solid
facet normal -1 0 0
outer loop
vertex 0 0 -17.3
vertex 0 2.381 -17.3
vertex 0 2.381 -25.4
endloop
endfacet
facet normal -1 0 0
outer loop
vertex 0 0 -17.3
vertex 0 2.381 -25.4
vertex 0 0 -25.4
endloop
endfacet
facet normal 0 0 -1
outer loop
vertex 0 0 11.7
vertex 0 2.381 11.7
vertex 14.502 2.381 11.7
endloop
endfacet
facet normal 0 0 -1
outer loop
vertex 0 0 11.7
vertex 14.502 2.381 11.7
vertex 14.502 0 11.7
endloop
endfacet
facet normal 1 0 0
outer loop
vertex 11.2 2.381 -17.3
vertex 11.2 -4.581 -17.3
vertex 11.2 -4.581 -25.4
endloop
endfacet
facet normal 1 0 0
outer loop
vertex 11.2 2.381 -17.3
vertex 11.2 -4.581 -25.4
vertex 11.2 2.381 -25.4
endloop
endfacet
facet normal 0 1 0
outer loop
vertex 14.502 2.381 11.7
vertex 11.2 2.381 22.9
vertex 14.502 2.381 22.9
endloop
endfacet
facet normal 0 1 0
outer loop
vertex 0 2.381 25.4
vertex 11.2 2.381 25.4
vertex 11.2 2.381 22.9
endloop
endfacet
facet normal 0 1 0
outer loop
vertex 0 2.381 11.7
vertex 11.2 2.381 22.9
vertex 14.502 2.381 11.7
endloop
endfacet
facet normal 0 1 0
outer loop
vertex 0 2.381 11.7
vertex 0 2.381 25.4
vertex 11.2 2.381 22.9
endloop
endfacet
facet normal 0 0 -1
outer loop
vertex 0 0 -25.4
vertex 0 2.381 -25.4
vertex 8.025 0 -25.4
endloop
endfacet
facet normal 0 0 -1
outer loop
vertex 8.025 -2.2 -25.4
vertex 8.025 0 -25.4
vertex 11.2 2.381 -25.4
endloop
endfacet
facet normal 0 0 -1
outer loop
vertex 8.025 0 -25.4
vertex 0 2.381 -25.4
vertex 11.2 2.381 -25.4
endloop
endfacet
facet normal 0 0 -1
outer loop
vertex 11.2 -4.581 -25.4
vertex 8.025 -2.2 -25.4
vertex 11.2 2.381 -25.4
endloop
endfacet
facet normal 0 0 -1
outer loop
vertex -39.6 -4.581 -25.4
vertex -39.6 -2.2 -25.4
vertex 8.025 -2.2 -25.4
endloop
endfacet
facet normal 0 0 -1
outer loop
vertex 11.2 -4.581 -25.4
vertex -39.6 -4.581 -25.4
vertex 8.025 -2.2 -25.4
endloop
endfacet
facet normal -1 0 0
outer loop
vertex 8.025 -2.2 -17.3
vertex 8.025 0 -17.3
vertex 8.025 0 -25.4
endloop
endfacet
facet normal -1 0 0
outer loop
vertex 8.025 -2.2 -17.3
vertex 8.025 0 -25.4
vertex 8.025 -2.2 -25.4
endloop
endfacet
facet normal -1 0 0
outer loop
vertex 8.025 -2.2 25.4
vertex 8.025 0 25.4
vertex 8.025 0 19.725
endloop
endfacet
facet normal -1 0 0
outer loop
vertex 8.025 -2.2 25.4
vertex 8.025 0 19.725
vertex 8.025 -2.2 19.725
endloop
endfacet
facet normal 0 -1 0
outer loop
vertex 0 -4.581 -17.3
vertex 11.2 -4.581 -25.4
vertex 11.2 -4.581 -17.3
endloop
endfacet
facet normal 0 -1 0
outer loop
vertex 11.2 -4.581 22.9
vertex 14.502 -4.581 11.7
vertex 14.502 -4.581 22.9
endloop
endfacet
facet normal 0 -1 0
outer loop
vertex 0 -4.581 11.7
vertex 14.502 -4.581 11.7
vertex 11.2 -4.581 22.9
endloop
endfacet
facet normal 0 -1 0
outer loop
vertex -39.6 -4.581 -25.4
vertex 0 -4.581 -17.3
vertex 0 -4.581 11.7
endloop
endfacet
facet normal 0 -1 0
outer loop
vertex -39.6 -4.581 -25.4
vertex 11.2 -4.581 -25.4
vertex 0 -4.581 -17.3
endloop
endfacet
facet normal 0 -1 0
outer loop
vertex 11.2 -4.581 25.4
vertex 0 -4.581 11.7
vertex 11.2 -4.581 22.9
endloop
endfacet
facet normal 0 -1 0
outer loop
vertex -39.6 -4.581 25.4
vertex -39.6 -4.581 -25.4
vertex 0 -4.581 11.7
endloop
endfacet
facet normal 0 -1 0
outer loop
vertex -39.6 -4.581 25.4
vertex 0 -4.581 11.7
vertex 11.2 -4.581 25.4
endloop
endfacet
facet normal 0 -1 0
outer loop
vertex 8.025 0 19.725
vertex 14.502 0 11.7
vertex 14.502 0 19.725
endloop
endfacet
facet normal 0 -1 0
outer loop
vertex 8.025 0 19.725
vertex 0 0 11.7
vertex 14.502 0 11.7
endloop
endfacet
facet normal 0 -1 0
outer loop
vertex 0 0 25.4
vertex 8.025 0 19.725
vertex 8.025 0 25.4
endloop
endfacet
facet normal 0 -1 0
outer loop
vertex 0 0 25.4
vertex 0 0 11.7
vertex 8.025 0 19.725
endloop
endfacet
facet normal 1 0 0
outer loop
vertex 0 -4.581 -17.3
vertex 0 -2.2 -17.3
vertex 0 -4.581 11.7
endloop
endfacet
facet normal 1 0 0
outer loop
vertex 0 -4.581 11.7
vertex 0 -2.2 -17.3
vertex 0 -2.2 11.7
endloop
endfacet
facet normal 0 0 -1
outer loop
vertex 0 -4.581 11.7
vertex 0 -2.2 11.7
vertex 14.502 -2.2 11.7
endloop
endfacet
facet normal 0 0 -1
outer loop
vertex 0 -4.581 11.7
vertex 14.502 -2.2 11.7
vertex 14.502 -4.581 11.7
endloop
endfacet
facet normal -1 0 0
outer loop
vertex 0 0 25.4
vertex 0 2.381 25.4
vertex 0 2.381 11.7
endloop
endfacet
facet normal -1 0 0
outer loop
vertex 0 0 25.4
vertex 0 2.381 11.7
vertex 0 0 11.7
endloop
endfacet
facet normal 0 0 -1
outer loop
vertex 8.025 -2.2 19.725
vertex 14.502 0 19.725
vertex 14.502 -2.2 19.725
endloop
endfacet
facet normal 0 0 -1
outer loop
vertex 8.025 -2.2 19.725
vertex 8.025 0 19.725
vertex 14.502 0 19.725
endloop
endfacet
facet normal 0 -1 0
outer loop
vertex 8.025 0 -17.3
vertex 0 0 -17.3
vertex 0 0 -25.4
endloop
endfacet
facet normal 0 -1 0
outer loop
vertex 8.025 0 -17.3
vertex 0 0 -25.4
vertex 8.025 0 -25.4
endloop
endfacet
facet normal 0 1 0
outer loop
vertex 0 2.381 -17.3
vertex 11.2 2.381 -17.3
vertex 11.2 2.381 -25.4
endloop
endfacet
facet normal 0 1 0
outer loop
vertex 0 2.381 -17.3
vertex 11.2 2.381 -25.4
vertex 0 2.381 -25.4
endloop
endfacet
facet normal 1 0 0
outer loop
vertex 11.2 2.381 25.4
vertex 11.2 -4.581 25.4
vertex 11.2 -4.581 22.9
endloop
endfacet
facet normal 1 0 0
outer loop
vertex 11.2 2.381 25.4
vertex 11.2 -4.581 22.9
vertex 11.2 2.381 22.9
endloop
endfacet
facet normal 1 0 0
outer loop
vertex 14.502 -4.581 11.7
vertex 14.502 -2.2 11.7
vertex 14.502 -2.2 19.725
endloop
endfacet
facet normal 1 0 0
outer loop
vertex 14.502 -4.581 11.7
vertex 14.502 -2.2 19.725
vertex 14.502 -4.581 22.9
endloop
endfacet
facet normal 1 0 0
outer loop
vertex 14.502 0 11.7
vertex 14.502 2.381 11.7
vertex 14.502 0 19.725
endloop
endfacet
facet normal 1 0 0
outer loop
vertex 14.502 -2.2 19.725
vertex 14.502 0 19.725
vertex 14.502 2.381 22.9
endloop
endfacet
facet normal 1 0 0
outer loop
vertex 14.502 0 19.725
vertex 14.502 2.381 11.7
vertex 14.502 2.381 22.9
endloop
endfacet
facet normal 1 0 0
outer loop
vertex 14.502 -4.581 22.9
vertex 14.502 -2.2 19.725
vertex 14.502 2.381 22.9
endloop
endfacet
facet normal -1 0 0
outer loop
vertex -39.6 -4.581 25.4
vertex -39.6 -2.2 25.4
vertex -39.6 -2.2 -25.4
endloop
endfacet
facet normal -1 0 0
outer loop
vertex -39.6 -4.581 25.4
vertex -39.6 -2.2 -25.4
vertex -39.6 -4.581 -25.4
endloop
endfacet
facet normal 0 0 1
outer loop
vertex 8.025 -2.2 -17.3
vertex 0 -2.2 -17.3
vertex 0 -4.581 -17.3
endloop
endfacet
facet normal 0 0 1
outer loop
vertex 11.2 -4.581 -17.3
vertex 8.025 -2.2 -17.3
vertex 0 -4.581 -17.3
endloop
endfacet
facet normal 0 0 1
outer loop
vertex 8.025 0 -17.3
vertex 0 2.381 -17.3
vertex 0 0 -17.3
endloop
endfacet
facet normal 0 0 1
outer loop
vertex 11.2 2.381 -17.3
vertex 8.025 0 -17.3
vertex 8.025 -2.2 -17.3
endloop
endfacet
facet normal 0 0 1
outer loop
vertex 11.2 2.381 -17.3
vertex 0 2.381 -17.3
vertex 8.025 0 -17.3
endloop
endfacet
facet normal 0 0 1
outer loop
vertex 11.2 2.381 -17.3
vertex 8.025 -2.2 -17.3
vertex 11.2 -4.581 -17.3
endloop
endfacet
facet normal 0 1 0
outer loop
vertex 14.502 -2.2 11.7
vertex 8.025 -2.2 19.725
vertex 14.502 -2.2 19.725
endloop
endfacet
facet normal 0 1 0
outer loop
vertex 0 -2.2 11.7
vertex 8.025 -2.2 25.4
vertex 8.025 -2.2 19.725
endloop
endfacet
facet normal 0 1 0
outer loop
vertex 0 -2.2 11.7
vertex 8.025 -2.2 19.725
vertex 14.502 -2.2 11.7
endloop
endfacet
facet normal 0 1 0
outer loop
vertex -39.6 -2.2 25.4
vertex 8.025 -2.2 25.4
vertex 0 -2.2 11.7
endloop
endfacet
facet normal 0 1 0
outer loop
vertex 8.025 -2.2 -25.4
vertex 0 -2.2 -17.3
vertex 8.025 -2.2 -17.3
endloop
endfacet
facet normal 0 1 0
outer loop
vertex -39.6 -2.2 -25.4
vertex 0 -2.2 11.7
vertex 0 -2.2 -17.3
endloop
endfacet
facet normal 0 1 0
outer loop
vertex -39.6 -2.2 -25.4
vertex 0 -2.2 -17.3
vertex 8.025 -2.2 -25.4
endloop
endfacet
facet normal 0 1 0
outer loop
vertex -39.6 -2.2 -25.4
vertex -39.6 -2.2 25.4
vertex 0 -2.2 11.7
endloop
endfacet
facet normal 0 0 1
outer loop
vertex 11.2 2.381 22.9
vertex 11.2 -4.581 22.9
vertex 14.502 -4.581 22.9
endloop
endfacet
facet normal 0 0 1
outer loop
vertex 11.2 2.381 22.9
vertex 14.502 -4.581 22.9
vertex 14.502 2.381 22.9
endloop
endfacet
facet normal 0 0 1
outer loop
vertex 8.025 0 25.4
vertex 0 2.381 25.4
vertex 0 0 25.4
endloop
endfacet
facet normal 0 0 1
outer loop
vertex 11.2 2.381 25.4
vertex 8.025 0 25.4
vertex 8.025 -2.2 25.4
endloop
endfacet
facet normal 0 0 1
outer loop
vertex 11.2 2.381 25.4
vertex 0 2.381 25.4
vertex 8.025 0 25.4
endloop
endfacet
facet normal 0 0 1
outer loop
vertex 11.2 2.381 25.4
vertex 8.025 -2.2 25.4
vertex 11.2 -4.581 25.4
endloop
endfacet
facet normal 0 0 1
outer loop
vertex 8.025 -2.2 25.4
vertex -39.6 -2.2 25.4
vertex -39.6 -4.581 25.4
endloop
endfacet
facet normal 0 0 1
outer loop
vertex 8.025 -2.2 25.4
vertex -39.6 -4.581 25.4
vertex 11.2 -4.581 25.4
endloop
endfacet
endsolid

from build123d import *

# Parameters (mm, degrees)
BOSS_EXTRUDE1_DEPTH = 25.4
SKETCH2_W           = 11.199999952
SKETCH2_H           = 23.399999936
SKETCH2_H_2         = 5.599999976
CUT_EXTRUDE1_DEPTH  = 48.558347416
BOSS_EXTRUDE2_DEPTH = 3.302
SKETCH4_W           = 3.175
SKETCH4_H           = 2.199999918
CUT_EXTRUDE2_DEPTH  = 8.024999952


with BuildPart() as part:
    # Sketch1 → Boss-Extrude1 (new, symmetric)
    with BuildSketch(Plane.XY):
        Polygon((0, 0), (8.024999952, 0), (8.024999952, -2.199999918), (-39.600000048, -2.199999918), (-39.600000048, -4.581249918), (11.199999952, -4.581249918), (11.199999952, 2.38125), (0, 2.38125), align=None)
    extrude(amount=BOSS_EXTRUDE1_DEPTH, both=True)

    # Sketch2 → Cut-Extrude1 (cut, through all)
    with BuildSketch(Plane(origin=(0, 2.38125, 0), x_dir=(1, 0, 0), z_dir=(0, 1, 0))):
        with Locations((5.599999976, 0)):
            Rectangle(SKETCH2_W, SKETCH2_H)
        with Locations((5.599999976, 14.499999956)):
            Rectangle(SKETCH2_W, SKETCH2_H_2)
    extrude(amount=-CUT_EXTRUDE1_DEPTH, mode=Mode.SUBTRACT)

    # Sketch3 → Boss-Extrude2 (add)
    with BuildSketch(Plane.ZY.offset(-11.199999952)):
        Polygon((22.89999992, 0), (19.72499992, 0), (19.72499992, -2.199999918), (11.699999968, -2.199999918), (11.699999968, -4.581249918), (22.89999992, -4.581249918), align=None)
        Polygon((11.699999968, 2.38125), (11.699999968, 0), (19.72499992, 0), (22.89999992, 0), (22.89999992, 2.38125), align=None)
    extrude(amount=-BOSS_EXTRUDE2_DEPTH)

    # Sketch4 → Cut-Extrude2 (cut)
    with BuildSketch(Plane(origin=(0, 0, 11.699999968), x_dir=(-1, 0, 0), z_dir=(0, 0, -1))):
        with Locations((-9.612499952, -1.099999959)):
            Rectangle(SKETCH4_W, SKETCH4_H)
    extrude(amount=-CUT_EXTRUDE2_DEPTH, mode=Mode.SUBTRACT)


solid = part.part
